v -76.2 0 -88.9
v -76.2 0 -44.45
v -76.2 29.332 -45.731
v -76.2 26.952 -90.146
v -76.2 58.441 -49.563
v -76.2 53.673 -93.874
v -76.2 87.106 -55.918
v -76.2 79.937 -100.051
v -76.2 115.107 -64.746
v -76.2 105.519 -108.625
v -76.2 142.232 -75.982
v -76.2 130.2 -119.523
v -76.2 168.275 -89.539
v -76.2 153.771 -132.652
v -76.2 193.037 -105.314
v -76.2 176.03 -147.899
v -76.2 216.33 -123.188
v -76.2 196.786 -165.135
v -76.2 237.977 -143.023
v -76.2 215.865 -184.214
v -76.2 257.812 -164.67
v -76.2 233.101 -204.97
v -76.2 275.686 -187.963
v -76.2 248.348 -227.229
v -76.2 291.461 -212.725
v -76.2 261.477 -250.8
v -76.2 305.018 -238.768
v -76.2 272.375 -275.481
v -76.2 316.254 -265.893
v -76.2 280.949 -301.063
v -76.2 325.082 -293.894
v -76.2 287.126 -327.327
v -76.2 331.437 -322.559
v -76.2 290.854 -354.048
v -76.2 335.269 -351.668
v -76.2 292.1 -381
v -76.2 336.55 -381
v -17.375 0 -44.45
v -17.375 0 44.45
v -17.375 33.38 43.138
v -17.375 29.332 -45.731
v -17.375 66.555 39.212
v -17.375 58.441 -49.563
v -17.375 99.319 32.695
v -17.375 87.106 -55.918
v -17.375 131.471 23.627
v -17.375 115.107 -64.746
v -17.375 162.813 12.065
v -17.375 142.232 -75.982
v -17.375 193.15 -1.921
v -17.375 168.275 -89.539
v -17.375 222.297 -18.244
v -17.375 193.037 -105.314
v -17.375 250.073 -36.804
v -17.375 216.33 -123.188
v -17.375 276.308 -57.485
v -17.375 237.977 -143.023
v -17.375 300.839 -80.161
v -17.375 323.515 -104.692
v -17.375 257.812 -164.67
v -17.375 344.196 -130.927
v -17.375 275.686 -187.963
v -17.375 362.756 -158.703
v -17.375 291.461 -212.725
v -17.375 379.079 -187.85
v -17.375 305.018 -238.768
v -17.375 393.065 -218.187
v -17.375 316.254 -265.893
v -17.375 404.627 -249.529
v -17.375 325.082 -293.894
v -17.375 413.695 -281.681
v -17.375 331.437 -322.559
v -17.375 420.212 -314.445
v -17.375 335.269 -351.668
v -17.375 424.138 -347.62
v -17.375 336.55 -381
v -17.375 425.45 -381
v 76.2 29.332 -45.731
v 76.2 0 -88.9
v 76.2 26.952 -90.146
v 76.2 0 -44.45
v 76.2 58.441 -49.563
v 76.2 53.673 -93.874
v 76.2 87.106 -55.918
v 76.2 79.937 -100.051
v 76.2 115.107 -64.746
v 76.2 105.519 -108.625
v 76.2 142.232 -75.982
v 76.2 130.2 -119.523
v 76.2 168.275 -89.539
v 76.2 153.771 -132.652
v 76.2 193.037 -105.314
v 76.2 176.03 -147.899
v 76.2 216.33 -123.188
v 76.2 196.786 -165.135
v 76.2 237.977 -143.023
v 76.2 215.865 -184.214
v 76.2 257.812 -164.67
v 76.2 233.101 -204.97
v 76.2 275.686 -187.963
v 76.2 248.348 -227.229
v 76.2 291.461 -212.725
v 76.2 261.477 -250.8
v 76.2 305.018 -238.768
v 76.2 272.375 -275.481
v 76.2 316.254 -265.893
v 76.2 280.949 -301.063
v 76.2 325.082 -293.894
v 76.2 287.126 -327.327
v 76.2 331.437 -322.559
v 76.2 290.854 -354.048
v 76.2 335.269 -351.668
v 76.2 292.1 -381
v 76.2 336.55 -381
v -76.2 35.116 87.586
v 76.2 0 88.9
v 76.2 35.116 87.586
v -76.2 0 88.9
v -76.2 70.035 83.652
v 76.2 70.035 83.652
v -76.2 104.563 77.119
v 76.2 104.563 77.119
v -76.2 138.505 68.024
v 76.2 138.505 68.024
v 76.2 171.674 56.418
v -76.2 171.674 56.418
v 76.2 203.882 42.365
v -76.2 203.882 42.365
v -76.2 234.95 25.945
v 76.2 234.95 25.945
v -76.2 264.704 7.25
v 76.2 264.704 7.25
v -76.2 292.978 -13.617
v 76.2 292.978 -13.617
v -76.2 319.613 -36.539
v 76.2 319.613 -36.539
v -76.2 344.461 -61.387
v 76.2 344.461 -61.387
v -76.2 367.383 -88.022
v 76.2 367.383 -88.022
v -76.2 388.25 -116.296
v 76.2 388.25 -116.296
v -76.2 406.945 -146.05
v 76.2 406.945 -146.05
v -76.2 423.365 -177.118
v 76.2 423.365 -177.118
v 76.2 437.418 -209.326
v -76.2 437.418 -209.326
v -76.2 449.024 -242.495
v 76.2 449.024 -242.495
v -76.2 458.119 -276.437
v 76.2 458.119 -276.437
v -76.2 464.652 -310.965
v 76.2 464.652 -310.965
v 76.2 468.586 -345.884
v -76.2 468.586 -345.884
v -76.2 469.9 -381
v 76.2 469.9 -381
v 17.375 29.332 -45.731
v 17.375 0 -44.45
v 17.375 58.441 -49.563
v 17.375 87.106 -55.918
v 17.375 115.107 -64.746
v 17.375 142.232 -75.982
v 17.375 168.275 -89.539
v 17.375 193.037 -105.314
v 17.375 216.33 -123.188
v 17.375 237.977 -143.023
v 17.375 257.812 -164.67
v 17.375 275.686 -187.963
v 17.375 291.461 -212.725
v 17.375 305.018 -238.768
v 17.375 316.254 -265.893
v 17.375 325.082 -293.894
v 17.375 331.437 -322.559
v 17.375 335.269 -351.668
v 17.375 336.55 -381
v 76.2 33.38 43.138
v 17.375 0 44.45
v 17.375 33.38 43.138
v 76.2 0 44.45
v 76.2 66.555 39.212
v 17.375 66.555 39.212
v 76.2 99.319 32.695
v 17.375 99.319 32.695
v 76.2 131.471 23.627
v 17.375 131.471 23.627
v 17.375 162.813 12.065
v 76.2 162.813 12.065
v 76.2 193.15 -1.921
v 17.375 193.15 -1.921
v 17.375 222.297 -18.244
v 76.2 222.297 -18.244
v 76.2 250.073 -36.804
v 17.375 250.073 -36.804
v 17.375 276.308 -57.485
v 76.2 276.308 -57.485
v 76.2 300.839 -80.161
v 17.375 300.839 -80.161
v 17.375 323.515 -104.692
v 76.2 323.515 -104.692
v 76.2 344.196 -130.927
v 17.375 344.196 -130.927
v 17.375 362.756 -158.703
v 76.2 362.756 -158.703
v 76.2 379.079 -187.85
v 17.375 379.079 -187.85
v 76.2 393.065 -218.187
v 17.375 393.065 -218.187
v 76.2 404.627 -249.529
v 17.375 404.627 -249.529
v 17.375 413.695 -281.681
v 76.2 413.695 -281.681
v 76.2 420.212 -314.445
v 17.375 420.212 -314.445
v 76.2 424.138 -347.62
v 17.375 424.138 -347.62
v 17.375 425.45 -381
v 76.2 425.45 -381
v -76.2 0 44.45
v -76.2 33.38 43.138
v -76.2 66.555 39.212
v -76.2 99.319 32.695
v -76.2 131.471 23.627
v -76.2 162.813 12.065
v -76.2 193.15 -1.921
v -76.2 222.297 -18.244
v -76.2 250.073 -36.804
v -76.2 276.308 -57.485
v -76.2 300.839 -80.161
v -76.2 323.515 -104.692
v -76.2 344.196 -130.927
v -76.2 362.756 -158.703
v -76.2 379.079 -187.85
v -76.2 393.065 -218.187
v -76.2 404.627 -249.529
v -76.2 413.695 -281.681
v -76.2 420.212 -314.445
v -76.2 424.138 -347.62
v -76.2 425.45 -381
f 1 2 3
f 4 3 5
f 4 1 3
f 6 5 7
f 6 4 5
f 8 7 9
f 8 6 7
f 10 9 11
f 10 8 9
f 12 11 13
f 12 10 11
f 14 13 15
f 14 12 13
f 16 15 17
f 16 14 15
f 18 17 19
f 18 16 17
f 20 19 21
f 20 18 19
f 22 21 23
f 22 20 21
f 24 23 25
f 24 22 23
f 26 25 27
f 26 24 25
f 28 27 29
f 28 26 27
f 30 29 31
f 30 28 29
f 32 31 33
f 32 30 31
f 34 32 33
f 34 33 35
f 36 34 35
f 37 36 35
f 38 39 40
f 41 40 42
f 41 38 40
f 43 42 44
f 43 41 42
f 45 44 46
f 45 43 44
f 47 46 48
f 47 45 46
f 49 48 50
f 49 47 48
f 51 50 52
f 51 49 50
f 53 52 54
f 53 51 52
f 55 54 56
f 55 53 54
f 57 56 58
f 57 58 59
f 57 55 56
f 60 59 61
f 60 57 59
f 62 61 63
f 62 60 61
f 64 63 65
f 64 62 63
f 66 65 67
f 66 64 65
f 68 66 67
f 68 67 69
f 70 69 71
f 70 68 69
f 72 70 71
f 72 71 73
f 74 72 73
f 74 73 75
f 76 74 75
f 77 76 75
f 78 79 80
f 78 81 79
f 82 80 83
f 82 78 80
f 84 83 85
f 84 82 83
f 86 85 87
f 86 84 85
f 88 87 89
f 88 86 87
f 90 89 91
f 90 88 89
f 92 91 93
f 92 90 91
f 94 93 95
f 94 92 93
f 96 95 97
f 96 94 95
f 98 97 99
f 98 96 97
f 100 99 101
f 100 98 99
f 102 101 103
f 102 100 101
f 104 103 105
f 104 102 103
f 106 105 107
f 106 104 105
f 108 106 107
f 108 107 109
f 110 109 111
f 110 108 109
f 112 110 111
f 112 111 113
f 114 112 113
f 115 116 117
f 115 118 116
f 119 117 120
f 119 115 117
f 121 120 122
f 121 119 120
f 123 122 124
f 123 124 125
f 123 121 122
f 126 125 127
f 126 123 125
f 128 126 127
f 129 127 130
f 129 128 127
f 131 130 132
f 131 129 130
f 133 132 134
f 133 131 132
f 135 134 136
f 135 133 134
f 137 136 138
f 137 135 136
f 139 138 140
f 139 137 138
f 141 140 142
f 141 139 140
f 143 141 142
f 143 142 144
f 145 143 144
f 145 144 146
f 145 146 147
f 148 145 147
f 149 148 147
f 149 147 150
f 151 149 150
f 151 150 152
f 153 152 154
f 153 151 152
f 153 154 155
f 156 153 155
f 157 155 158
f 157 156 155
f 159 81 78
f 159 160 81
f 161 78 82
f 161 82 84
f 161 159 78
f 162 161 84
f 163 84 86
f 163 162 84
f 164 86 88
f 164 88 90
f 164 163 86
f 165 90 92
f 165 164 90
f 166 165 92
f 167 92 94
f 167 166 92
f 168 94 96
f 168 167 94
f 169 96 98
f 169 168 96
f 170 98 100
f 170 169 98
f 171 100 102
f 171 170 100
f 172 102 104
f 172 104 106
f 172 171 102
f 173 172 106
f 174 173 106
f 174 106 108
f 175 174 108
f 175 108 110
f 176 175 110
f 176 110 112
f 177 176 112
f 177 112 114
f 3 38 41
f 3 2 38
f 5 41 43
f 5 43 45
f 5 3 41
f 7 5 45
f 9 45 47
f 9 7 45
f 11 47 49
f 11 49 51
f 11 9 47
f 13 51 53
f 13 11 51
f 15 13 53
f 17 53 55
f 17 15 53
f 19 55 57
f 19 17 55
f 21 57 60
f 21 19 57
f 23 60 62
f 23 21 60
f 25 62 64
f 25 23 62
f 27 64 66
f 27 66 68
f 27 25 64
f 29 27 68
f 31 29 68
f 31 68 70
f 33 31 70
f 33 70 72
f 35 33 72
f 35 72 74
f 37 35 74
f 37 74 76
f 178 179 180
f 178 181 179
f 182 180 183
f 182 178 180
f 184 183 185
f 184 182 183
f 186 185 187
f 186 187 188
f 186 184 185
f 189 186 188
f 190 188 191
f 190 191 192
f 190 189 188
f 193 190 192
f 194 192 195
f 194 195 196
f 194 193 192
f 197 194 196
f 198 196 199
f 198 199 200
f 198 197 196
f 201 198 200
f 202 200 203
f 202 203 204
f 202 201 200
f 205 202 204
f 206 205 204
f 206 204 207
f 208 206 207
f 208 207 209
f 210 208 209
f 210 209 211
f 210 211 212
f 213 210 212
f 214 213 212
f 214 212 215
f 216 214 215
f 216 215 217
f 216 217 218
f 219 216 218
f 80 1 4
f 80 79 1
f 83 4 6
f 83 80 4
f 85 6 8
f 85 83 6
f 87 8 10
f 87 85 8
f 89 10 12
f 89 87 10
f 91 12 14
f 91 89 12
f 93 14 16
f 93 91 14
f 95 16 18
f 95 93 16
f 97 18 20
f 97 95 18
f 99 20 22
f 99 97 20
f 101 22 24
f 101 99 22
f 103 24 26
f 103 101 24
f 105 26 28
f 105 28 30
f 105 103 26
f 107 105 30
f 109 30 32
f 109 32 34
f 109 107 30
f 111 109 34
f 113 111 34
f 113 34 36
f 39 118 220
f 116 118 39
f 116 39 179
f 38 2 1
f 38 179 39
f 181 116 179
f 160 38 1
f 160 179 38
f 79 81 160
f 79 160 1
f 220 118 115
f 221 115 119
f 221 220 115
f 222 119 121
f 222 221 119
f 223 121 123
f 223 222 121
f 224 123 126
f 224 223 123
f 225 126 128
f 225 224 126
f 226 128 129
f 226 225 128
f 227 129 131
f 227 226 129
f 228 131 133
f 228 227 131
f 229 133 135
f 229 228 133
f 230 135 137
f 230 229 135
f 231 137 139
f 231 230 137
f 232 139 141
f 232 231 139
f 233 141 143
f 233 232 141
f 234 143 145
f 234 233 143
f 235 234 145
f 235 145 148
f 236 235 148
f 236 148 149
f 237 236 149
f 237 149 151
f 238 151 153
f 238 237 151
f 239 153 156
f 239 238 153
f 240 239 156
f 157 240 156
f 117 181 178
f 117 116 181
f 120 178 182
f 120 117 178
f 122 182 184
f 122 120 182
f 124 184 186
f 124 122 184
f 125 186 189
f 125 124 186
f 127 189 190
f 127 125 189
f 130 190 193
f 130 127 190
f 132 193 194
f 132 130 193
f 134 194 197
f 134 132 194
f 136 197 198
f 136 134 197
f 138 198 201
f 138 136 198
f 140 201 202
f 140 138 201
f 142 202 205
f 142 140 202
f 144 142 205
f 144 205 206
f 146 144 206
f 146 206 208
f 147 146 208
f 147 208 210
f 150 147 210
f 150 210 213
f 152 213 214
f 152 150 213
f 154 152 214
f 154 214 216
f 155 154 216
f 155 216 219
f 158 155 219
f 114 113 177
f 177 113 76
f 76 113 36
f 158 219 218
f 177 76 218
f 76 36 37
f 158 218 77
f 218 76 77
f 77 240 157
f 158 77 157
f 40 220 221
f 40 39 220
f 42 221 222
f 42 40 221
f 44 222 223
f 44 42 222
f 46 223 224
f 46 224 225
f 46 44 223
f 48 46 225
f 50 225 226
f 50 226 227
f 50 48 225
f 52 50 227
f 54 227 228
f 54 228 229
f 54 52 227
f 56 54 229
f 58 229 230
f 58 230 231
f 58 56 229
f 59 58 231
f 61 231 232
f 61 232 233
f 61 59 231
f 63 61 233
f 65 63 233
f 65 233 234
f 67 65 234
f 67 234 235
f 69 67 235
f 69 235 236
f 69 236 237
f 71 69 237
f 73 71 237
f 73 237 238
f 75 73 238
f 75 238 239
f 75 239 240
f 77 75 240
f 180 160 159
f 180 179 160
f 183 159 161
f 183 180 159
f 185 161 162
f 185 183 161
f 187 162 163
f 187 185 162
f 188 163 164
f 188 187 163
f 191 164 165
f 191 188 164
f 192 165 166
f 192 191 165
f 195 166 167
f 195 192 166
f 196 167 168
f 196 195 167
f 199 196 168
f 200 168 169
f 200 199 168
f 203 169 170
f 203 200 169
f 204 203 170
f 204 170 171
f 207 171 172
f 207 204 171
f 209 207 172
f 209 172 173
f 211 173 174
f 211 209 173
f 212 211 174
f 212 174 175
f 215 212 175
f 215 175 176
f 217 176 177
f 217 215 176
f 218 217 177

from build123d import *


# Not quite as in the source:
# - a feature of the source that left no trace in its solid (it failed there, or was rolled back) is left out


with BuildPart() as f2:
    # F2: sweep along a path in F1
    with BuildLine(Plane.YZ) as f2_path:
        ThreePointArc((0, 0), (269.4076836321, -111.5923163679), (381, -381))
    # F0 (on Front) → F2 (sweep)
    with BuildSketch(Plane.XZ):
        Polygon((76.2, 88.9), (0, 88.9), (-76.2, 88.9), (-76.2, 44.45), (-17.3748321831, 44.45), (-17.3748321831, 0), (-17.3748321831, -44.45), (-76.2, -44.45), (-76.2, -88.9), (0, -88.9), (76.2, -88.9), (76.2, -44.45), (17.3748321831, -44.45), (17.3748321831, 0), (17.3748321831, 44.45), (76.2, 44.45), align=None)
    sweep(path=f2_path.line)


solid = f2.part
